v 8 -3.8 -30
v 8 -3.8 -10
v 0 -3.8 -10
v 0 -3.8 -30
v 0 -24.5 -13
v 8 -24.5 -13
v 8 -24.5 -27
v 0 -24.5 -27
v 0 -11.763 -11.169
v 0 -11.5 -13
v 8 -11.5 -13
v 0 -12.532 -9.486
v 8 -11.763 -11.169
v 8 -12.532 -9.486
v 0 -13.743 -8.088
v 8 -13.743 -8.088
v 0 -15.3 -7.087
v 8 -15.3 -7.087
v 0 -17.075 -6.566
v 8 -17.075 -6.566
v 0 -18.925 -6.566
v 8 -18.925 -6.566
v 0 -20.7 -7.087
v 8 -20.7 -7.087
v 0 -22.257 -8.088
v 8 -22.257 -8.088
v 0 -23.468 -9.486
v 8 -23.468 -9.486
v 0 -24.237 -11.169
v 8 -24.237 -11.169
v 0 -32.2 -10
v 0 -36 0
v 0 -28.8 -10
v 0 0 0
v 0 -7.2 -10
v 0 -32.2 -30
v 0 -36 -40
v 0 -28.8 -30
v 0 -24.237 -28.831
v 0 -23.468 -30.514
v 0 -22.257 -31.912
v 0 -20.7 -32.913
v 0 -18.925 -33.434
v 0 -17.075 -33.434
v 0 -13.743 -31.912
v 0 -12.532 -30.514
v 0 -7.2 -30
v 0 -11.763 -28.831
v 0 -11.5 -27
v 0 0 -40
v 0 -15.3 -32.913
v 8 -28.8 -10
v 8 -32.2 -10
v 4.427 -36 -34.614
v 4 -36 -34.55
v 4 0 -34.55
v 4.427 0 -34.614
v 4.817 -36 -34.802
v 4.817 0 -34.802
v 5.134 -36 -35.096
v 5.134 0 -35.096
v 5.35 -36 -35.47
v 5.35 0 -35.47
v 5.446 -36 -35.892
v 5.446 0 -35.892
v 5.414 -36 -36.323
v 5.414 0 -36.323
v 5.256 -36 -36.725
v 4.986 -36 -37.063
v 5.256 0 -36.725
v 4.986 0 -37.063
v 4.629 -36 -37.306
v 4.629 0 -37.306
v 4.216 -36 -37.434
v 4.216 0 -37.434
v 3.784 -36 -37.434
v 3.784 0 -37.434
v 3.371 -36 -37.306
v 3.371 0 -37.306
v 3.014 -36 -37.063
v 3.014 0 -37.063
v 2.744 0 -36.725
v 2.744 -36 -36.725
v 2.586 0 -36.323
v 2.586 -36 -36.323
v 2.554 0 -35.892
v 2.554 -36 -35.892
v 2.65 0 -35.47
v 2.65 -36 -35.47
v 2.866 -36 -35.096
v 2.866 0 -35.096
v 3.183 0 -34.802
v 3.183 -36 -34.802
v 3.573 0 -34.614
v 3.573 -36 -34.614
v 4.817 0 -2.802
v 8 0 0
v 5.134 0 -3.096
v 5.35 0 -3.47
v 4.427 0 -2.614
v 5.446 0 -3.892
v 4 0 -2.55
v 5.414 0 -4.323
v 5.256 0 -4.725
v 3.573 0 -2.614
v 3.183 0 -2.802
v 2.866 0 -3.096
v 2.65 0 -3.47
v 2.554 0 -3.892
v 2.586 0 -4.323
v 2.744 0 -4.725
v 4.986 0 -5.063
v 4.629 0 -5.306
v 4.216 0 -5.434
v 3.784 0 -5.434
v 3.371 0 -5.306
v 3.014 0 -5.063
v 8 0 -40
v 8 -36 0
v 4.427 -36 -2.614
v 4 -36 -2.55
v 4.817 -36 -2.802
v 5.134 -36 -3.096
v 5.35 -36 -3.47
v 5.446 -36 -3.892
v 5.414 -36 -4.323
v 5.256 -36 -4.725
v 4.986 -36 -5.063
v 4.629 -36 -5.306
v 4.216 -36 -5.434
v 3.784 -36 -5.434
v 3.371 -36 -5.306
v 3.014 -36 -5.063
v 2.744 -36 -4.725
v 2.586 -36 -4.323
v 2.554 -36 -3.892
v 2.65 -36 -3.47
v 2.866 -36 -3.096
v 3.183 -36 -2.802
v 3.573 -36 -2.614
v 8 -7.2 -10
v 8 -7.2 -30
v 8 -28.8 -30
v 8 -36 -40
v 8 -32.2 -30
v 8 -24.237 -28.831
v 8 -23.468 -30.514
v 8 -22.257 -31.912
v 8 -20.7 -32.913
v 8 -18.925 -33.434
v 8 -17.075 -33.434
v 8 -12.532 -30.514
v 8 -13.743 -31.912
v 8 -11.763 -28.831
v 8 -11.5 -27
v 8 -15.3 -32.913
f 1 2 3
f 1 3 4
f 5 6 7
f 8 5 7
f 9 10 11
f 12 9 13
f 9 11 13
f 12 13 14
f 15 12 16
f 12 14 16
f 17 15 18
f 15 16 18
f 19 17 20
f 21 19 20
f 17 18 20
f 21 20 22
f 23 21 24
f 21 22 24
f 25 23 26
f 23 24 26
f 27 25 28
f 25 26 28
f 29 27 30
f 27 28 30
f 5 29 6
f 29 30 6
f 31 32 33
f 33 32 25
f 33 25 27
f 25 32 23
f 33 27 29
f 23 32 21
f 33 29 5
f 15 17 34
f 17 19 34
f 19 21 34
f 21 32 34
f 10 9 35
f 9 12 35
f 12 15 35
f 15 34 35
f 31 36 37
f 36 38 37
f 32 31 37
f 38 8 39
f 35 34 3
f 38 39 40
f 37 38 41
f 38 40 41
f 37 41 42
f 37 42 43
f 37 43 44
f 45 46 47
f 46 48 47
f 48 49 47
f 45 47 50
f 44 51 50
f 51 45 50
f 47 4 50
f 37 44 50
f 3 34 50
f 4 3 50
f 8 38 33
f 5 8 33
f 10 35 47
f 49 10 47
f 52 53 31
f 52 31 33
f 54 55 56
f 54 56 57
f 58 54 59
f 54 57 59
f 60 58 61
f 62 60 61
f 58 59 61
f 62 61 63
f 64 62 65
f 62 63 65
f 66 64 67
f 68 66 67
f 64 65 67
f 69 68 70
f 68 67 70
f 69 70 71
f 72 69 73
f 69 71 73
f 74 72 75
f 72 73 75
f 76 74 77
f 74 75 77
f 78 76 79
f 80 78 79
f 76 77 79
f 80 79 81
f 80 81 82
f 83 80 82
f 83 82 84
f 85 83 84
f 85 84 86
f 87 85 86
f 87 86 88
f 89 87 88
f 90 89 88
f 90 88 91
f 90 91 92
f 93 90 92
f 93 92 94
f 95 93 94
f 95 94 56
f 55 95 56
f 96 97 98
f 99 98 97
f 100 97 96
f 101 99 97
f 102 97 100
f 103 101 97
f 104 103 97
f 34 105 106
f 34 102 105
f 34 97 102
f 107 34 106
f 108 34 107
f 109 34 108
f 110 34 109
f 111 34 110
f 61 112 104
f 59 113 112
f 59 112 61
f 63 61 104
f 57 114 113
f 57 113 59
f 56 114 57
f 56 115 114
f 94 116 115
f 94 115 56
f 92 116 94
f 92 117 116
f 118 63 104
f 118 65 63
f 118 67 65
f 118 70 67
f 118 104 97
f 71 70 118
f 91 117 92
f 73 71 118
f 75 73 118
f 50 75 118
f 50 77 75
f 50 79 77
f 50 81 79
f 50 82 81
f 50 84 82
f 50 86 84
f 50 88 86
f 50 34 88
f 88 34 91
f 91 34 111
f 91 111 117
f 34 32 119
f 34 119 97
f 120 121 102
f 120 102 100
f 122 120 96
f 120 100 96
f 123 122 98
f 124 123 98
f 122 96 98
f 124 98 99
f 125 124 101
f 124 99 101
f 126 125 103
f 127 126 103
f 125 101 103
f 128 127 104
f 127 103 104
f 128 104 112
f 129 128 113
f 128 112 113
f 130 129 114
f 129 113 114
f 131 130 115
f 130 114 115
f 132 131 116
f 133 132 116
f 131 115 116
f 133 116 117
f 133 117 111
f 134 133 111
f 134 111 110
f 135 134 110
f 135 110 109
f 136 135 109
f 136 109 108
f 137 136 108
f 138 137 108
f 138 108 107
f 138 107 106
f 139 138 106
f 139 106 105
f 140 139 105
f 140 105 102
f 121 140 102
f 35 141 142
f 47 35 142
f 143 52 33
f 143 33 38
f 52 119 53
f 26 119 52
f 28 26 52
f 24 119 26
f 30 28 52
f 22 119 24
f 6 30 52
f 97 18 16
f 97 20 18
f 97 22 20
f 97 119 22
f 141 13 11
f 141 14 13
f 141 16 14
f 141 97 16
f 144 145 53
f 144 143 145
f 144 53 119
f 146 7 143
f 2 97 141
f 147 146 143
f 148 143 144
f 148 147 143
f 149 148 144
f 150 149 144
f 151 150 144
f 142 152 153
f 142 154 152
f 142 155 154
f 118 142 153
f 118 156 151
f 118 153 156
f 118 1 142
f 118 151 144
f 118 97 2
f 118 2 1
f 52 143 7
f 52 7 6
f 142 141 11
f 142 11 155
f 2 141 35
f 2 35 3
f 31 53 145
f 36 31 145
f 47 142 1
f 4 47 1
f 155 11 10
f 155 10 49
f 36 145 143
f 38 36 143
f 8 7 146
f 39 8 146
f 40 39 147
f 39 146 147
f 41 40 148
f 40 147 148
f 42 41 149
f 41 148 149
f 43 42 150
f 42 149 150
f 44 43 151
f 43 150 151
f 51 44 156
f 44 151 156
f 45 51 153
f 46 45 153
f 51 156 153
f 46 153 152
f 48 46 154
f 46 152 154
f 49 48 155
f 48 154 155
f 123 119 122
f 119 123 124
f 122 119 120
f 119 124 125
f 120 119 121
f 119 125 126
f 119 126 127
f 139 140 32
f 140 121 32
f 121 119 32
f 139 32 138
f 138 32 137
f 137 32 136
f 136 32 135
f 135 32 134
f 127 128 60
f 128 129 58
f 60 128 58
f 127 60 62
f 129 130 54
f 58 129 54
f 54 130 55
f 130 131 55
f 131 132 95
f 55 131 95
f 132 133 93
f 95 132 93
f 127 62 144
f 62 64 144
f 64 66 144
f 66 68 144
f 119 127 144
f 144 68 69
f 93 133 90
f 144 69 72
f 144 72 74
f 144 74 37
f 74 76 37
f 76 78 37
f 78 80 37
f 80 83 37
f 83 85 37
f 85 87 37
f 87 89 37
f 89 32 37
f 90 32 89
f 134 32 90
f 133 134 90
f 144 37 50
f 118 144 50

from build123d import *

# Parameters (mm, degrees)
SKETCH1_W           = 40
SKETCH1_H           = 36
BOSS_EXTRUDE1_DEPTH = 8
SKETCH2_R           = 6
CUT_EXTRUDE1_DEPTH  = 55.405882035
SKETCH3_W           = 20
SKETCH3_H           = 3.4
CUT_EXTRUDE2_DEPTH  = 55.405882035
SKETCH6_R           = 1.45
CUT_EXTRUDE3_DEPTH  = 55.405882035
SKETCH7_R           = 6.5
SKETCH7_W           = 14
SKETCH7_H           = 13
CUT_EXTRUDE4_DEPTH  = 55.405882035


with BuildPart() as part:
    # Sketch1 → Boss-Extrude1 (new body)
    with BuildSketch(Plane(origin=(0, 0, 0), x_dir=(0, 0, -1), z_dir=(1, 0, 0))):
        with Locations((20, -18)):
            Rectangle(SKETCH1_W, SKETCH1_H)
    extrude(amount=BOSS_EXTRUDE1_DEPTH)

    # Sketch2 → Cut-Extrude1 (cut, through all)
    with BuildSketch(Plane(origin=(8, 0, 0), x_dir=(0, 0, -1), z_dir=(1, 0, 0))):
        with Locations((20, -18)):
            Circle(SKETCH2_R)
    extrude(amount=-CUT_EXTRUDE1_DEPTH, mode=Mode.SUBTRACT)

    # Sketch3 → Cut-Extrude2 (cut, through all)
    with BuildSketch(Plane(origin=(8, 0, 0), x_dir=(0, 0, -1), z_dir=(1, 0, 0))):
        with Locations((20, -5.5)):
            Rectangle(SKETCH3_W, SKETCH3_H)
        with Locations((20, -30.5)):
            Rectangle(SKETCH3_W, SKETCH3_H)
    extrude(amount=-CUT_EXTRUDE2_DEPTH, mode=Mode.SUBTRACT)

    # Sketch6 → Cut-Extrude3 (cut, through all)
    with BuildSketch(Plane(origin=(0, 0, 0), x_dir=(1, 0, 0), z_dir=(0, 1, 0))):
        with Locations(Location((4, 4, 0), (0, 0, 270))):
            Circle(SKETCH6_R)
        with Locations(Location((4, 36, 0), (0, 0, 270))):
            Circle(SKETCH6_R)
    extrude(amount=-CUT_EXTRUDE3_DEPTH, mode=Mode.SUBTRACT)

    # Sketch7 → Cut-Extrude4 (cut, through all)
    with BuildSketch(Plane(origin=(8, 0, 0), x_dir=(0, 0, -1), z_dir=(1, 0, 0))):
        with Locations((27, -18)):
            Circle(SKETCH7_R)
        with Locations((13, -18)):
            Circle(SKETCH7_R)
        with Locations((20, -18)):
            Rectangle(SKETCH7_W, SKETCH7_H)
    extrude(amount=-CUT_EXTRUDE4_DEPTH, mode=Mode.SUBTRACT)


solid = part.part
